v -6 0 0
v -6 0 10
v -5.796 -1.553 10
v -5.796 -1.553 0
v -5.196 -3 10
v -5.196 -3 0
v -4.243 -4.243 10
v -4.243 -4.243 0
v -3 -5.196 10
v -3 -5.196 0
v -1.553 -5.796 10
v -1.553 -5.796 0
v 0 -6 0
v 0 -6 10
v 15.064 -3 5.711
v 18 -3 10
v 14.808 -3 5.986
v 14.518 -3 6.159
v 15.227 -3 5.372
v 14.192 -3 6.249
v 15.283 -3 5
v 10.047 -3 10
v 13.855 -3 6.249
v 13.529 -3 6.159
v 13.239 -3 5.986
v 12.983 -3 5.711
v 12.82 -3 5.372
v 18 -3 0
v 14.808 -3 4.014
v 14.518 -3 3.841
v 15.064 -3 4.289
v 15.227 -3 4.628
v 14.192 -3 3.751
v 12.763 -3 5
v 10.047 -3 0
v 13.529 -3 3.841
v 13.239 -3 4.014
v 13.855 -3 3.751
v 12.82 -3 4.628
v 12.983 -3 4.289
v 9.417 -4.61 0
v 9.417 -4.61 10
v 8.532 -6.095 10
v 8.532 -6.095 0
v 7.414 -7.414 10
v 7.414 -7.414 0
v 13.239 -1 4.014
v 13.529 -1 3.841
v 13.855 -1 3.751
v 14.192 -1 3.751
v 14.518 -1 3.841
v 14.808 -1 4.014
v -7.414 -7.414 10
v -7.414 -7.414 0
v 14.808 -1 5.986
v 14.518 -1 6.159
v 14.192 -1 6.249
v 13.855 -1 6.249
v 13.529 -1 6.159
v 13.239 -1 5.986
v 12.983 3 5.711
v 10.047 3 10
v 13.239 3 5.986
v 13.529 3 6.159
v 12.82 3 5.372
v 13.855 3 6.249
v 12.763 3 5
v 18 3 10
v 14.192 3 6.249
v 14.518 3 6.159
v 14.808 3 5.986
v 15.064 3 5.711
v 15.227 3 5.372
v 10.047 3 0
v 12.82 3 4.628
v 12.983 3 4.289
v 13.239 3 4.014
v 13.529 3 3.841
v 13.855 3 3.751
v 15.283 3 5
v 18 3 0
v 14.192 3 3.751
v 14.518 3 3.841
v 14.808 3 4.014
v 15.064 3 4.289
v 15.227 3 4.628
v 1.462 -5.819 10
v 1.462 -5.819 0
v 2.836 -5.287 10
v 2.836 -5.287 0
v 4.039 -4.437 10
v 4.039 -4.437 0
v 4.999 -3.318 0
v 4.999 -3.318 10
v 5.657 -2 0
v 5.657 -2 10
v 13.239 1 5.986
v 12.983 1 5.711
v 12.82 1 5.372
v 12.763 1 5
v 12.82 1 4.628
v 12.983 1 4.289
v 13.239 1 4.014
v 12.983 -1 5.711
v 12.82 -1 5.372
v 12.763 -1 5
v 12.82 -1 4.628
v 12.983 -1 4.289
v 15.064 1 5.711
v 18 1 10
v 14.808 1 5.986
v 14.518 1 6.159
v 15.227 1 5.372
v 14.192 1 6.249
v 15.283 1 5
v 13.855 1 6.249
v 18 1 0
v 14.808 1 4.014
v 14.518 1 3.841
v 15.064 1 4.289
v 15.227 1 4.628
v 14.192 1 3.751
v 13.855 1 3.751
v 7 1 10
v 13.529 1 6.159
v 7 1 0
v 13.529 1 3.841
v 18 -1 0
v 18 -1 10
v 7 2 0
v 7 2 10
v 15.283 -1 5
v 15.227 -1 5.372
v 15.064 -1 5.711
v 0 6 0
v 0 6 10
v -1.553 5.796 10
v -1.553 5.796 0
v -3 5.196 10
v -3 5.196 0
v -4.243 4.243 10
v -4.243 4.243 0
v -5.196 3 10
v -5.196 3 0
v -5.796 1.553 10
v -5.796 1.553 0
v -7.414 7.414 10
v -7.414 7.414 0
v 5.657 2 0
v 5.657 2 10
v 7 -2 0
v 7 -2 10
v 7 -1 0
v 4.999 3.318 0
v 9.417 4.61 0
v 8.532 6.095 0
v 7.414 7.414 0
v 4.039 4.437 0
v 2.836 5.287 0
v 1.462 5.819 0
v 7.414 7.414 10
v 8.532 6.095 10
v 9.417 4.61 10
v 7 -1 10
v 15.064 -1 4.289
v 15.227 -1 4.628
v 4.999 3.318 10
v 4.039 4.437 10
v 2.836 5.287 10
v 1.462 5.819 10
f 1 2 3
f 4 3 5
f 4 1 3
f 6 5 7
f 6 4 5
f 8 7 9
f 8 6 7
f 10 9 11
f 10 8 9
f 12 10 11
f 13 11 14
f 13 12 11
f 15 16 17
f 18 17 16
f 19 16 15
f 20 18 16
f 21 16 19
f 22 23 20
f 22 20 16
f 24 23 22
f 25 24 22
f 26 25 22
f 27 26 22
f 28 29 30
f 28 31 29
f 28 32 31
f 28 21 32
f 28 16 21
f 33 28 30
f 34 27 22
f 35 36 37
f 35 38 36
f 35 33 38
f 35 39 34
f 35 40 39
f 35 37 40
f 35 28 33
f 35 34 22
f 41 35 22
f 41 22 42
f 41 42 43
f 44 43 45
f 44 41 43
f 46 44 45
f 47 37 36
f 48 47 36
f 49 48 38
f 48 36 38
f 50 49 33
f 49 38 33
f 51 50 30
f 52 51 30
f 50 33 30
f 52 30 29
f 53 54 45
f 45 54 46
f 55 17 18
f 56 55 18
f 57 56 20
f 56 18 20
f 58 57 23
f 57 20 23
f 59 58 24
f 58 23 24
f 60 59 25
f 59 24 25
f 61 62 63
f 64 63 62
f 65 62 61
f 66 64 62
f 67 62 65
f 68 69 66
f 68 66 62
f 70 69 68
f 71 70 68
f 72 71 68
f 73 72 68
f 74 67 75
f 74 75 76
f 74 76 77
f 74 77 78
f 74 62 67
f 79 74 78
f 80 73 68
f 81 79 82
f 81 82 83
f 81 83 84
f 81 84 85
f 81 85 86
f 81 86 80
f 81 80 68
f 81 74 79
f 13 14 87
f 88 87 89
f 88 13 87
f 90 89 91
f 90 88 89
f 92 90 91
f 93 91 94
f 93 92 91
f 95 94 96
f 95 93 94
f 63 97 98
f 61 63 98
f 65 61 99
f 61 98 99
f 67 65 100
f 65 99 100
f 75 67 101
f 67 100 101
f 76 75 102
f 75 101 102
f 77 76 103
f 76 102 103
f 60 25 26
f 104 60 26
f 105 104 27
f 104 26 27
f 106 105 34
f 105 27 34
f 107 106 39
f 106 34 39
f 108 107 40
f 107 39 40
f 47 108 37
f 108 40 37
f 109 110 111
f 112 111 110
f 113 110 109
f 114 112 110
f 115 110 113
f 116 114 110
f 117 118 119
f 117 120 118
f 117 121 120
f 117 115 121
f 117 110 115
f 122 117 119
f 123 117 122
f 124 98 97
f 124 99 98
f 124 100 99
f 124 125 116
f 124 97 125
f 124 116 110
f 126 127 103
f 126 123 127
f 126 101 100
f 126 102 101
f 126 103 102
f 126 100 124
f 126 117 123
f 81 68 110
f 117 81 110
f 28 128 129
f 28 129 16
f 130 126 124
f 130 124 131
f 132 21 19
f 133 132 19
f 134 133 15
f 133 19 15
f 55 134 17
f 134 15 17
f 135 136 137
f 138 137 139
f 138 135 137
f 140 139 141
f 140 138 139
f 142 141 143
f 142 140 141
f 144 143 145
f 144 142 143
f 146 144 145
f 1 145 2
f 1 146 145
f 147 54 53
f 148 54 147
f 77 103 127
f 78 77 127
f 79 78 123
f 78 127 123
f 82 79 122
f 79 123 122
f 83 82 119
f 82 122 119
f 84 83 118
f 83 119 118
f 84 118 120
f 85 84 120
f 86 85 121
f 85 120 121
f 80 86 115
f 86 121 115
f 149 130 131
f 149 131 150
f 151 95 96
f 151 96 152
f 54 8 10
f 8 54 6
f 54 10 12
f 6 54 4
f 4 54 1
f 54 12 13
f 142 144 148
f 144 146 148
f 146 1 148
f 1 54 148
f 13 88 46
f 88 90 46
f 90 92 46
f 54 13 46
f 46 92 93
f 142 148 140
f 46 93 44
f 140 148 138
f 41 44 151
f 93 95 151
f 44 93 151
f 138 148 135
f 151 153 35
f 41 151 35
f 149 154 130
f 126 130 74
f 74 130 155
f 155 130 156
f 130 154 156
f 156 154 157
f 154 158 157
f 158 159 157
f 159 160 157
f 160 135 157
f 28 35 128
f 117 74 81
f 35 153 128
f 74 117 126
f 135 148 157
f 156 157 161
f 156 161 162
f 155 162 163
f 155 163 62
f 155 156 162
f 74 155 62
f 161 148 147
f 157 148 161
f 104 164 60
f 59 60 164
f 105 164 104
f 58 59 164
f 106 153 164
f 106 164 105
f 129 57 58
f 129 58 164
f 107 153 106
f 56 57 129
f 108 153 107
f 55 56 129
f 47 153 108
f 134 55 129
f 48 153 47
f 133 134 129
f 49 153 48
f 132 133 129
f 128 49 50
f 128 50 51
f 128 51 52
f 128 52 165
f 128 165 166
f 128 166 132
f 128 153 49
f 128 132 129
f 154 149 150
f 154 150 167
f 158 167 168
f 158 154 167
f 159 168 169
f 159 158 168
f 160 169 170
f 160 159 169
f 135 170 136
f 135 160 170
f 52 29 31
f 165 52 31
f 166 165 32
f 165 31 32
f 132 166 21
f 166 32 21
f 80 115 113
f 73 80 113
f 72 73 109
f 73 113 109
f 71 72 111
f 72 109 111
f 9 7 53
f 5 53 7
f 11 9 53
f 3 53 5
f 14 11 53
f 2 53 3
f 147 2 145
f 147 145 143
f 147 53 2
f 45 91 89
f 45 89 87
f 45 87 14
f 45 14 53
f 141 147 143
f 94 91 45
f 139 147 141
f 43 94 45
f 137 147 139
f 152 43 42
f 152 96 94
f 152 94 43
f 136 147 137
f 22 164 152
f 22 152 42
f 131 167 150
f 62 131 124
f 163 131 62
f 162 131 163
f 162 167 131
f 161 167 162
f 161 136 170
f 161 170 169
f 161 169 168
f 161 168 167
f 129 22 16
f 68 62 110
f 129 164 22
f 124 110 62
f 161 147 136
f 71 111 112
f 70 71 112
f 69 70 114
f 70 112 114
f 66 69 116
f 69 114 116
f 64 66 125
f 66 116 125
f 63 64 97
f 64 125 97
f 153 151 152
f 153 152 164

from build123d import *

# Parameters (mm, degrees)
SKETCH_1_W           = 30
SKETCH_1_H           = 14.828427124
EXTRUDE_2_DEPTH      = 10
CUT_EXTRUDE_9_DEPTH  = 15
CUT_EXTRUDE_10_DEPTH = 30
CUT_EXTRUDE_11_DEPTH = 31
CUT_EXTRUDE_12_DEPTH = 40
CUT_EXTRUDE_13_DEPTH = 17
CUT_EXTRUDE_17_DEPTH = 97
CUT_EXTRUDE_18_DEPTH = 285
CUT_EXTRUDE_20_DEPTH = 202
SKETCH_2_R           = 1.26
CUT_EXTRUDE_21_DEPTH = 202
SKETCH_1_23_W        = 11
SKETCH_1_23_H        = 2
CUT_EXTRUDE_22_DEPTH = 95


with BuildPart() as part:
    # 草图1 → 凸台-拉伸2 (new body)
    with BuildSketch(Plane.XY):
        with Locations((7.585786438, 0)):
            Rectangle(SKETCH_1_W, SKETCH_1_H)
    extrude(amount=EXTRUDE_2_DEPTH)

    # 草图1<11> → 切除-拉伸9 (cut)
    with BuildSketch(Plane.XY):
        with BuildLine():
            Line((0, -2), (0, 0))
            Line((0, 0), (-6, 0))
            ThreePointArc((-6, 0), (-4.242640687, -4.242640687), (0, -6))
            ThreePointArc((0, -6), (3.464101615, -4.898979486), (5.656854249, -2))
            Line((5.656854249, -2), (0, -2))
        make_face()
    extrude(amount=CUT_EXTRUDE_9_DEPTH, mode=Mode.SUBTRACT)

    # 草图1<12> → 切除-拉伸10 (cut)
    with BuildSketch(Plane.XY):
        with BuildLine():
            Line((-6, 0), (0, 0))
            Line((0, 0), (0, 2))
            Line((0, 2), (0, 6))
            ThreePointArc((0, 6), (-4.242640687, 4.242640687), (-6, 0))
        make_face()
    extrude(amount=CUT_EXTRUDE_10_DEPTH, mode=Mode.SUBTRACT)

    # 草图1<13> → 切除-拉伸11 (cut)
    with BuildSketch(Plane.XY):
        with BuildLine():
            Line((0, 2), (0, 0))
            Line((0, 0), (6, 0))
            ThreePointArc((6, 0), (5.913591358, 1.014611872), (5.656854249, 2))
            Line((5.656854249, 2), (0, 2))
        make_face()
    extrude(amount=CUT_EXTRUDE_11_DEPTH, mode=Mode.SUBTRACT)

    # 草图1<14> → 切除-拉伸12 (cut)
    with BuildSketch(Plane.XY):
        with BuildLine():
            Line((6, 0), (0, 0))
            Line((0, 0), (0, -2))
            Line((0, -2), (5.656854249, -2))
            ThreePointArc((5.656854249, -2), (5.913591358, -1.014611872), (6, 0))
        make_face()
    extrude(amount=CUT_EXTRUDE_12_DEPTH, mode=Mode.SUBTRACT)

    # 草图1<15> → 切除-拉伸13 (cut)
    with BuildSketch(Plane.XY):
        with BuildLine():
            Line((0, 6), (0, 2))
            Line((0, 2), (5.656854249, 2))
            ThreePointArc((5.656854249, 2), (3.464101615, 4.898979486), (0, 6))
        make_face()
    extrude(amount=CUT_EXTRUDE_13_DEPTH, mode=Mode.SUBTRACT)

    # 草图1<19> → 切除-拉伸17 (cut)
    with BuildSketch(Plane.XY):
        with BuildLine():
            Line((7, 2), (5.656854249, 2))
            ThreePointArc((5.656854249, 2), (6, 0), (5.656854249, -2))
            Line((5.656854249, -2), (7, -2))
            Line((7, -2), (7, 2))
        make_face()
    extrude(amount=CUT_EXTRUDE_17_DEPTH, mode=Mode.SUBTRACT)

    # 草图1<20> → 切除-拉伸18 (cut)
    with BuildSketch(Plane.XY):
        with BuildLine():
            ThreePointArc((7.414213562, 7.414213562), (9.005239827, 5.370919954), (10.046946078, 3))
            Line((10.046946078, 3), (18, 3))
            Line((18, 3), (18, 2))
            Line((18, 2), (18, 1))
            Line((18, 1), (18, -1))
            Line((18, -1), (18, -2))
            Line((18, -2), (18, -3))
            Line((18, -3), (10.046946078, -3))
            ThreePointArc((10.046946078, -3), (9.005239827, -5.370919954), (7.414213562, -7.414213562))
            Line((7.414213562, -7.414213562), (22.585786438, -7.414213562))
            Line((22.585786438, -7.414213562), (22.585786438, 7.414213562))
            Line((22.585786438, 7.414213562), (7.414213562, 7.414213562))
        make_face()
    extrude(amount=CUT_EXTRUDE_18_DEPTH, mode=Mode.SUBTRACT)

    # 草图1<22> → 切除-拉伸20 (cut)
    with BuildSketch(Plane.XY):
        with BuildLine():
            ThreePointArc((10.485281374, 0), (10.473325852, -0.500570761), (10.437486551, -1))
            Line((10.437486551, -1), (18, -1))
            Line((18, -1), (18, 1))
            Line((18, 1), (10.437486551, 1))
            ThreePointArc((10.437486551, 1), (10.473325852, 0.500570761), (10.485281374, 0))
        make_face()
    extrude(amount=CUT_EXTRUDE_20_DEPTH, mode=Mode.SUBTRACT)

    # 草图2 → 切除-拉伸21 (cut)
    with BuildSketch(Plane.XZ.offset(3)):
        with Locations((14.023473039, 5)):
            Circle(SKETCH_2_R)
    extrude(amount=-CUT_EXTRUDE_21_DEPTH, mode=Mode.SUBTRACT)

    # 草图1<23> → 切除-拉伸22 (cut)
    with BuildSketch(Plane.XY):
        with Locations((12.5, 0)):
            Rectangle(SKETCH_1_23_W, SKETCH_1_23_H)
    extrude(amount=CUT_EXTRUDE_22_DEPTH, mode=Mode.SUBTRACT)


solid = part.part
